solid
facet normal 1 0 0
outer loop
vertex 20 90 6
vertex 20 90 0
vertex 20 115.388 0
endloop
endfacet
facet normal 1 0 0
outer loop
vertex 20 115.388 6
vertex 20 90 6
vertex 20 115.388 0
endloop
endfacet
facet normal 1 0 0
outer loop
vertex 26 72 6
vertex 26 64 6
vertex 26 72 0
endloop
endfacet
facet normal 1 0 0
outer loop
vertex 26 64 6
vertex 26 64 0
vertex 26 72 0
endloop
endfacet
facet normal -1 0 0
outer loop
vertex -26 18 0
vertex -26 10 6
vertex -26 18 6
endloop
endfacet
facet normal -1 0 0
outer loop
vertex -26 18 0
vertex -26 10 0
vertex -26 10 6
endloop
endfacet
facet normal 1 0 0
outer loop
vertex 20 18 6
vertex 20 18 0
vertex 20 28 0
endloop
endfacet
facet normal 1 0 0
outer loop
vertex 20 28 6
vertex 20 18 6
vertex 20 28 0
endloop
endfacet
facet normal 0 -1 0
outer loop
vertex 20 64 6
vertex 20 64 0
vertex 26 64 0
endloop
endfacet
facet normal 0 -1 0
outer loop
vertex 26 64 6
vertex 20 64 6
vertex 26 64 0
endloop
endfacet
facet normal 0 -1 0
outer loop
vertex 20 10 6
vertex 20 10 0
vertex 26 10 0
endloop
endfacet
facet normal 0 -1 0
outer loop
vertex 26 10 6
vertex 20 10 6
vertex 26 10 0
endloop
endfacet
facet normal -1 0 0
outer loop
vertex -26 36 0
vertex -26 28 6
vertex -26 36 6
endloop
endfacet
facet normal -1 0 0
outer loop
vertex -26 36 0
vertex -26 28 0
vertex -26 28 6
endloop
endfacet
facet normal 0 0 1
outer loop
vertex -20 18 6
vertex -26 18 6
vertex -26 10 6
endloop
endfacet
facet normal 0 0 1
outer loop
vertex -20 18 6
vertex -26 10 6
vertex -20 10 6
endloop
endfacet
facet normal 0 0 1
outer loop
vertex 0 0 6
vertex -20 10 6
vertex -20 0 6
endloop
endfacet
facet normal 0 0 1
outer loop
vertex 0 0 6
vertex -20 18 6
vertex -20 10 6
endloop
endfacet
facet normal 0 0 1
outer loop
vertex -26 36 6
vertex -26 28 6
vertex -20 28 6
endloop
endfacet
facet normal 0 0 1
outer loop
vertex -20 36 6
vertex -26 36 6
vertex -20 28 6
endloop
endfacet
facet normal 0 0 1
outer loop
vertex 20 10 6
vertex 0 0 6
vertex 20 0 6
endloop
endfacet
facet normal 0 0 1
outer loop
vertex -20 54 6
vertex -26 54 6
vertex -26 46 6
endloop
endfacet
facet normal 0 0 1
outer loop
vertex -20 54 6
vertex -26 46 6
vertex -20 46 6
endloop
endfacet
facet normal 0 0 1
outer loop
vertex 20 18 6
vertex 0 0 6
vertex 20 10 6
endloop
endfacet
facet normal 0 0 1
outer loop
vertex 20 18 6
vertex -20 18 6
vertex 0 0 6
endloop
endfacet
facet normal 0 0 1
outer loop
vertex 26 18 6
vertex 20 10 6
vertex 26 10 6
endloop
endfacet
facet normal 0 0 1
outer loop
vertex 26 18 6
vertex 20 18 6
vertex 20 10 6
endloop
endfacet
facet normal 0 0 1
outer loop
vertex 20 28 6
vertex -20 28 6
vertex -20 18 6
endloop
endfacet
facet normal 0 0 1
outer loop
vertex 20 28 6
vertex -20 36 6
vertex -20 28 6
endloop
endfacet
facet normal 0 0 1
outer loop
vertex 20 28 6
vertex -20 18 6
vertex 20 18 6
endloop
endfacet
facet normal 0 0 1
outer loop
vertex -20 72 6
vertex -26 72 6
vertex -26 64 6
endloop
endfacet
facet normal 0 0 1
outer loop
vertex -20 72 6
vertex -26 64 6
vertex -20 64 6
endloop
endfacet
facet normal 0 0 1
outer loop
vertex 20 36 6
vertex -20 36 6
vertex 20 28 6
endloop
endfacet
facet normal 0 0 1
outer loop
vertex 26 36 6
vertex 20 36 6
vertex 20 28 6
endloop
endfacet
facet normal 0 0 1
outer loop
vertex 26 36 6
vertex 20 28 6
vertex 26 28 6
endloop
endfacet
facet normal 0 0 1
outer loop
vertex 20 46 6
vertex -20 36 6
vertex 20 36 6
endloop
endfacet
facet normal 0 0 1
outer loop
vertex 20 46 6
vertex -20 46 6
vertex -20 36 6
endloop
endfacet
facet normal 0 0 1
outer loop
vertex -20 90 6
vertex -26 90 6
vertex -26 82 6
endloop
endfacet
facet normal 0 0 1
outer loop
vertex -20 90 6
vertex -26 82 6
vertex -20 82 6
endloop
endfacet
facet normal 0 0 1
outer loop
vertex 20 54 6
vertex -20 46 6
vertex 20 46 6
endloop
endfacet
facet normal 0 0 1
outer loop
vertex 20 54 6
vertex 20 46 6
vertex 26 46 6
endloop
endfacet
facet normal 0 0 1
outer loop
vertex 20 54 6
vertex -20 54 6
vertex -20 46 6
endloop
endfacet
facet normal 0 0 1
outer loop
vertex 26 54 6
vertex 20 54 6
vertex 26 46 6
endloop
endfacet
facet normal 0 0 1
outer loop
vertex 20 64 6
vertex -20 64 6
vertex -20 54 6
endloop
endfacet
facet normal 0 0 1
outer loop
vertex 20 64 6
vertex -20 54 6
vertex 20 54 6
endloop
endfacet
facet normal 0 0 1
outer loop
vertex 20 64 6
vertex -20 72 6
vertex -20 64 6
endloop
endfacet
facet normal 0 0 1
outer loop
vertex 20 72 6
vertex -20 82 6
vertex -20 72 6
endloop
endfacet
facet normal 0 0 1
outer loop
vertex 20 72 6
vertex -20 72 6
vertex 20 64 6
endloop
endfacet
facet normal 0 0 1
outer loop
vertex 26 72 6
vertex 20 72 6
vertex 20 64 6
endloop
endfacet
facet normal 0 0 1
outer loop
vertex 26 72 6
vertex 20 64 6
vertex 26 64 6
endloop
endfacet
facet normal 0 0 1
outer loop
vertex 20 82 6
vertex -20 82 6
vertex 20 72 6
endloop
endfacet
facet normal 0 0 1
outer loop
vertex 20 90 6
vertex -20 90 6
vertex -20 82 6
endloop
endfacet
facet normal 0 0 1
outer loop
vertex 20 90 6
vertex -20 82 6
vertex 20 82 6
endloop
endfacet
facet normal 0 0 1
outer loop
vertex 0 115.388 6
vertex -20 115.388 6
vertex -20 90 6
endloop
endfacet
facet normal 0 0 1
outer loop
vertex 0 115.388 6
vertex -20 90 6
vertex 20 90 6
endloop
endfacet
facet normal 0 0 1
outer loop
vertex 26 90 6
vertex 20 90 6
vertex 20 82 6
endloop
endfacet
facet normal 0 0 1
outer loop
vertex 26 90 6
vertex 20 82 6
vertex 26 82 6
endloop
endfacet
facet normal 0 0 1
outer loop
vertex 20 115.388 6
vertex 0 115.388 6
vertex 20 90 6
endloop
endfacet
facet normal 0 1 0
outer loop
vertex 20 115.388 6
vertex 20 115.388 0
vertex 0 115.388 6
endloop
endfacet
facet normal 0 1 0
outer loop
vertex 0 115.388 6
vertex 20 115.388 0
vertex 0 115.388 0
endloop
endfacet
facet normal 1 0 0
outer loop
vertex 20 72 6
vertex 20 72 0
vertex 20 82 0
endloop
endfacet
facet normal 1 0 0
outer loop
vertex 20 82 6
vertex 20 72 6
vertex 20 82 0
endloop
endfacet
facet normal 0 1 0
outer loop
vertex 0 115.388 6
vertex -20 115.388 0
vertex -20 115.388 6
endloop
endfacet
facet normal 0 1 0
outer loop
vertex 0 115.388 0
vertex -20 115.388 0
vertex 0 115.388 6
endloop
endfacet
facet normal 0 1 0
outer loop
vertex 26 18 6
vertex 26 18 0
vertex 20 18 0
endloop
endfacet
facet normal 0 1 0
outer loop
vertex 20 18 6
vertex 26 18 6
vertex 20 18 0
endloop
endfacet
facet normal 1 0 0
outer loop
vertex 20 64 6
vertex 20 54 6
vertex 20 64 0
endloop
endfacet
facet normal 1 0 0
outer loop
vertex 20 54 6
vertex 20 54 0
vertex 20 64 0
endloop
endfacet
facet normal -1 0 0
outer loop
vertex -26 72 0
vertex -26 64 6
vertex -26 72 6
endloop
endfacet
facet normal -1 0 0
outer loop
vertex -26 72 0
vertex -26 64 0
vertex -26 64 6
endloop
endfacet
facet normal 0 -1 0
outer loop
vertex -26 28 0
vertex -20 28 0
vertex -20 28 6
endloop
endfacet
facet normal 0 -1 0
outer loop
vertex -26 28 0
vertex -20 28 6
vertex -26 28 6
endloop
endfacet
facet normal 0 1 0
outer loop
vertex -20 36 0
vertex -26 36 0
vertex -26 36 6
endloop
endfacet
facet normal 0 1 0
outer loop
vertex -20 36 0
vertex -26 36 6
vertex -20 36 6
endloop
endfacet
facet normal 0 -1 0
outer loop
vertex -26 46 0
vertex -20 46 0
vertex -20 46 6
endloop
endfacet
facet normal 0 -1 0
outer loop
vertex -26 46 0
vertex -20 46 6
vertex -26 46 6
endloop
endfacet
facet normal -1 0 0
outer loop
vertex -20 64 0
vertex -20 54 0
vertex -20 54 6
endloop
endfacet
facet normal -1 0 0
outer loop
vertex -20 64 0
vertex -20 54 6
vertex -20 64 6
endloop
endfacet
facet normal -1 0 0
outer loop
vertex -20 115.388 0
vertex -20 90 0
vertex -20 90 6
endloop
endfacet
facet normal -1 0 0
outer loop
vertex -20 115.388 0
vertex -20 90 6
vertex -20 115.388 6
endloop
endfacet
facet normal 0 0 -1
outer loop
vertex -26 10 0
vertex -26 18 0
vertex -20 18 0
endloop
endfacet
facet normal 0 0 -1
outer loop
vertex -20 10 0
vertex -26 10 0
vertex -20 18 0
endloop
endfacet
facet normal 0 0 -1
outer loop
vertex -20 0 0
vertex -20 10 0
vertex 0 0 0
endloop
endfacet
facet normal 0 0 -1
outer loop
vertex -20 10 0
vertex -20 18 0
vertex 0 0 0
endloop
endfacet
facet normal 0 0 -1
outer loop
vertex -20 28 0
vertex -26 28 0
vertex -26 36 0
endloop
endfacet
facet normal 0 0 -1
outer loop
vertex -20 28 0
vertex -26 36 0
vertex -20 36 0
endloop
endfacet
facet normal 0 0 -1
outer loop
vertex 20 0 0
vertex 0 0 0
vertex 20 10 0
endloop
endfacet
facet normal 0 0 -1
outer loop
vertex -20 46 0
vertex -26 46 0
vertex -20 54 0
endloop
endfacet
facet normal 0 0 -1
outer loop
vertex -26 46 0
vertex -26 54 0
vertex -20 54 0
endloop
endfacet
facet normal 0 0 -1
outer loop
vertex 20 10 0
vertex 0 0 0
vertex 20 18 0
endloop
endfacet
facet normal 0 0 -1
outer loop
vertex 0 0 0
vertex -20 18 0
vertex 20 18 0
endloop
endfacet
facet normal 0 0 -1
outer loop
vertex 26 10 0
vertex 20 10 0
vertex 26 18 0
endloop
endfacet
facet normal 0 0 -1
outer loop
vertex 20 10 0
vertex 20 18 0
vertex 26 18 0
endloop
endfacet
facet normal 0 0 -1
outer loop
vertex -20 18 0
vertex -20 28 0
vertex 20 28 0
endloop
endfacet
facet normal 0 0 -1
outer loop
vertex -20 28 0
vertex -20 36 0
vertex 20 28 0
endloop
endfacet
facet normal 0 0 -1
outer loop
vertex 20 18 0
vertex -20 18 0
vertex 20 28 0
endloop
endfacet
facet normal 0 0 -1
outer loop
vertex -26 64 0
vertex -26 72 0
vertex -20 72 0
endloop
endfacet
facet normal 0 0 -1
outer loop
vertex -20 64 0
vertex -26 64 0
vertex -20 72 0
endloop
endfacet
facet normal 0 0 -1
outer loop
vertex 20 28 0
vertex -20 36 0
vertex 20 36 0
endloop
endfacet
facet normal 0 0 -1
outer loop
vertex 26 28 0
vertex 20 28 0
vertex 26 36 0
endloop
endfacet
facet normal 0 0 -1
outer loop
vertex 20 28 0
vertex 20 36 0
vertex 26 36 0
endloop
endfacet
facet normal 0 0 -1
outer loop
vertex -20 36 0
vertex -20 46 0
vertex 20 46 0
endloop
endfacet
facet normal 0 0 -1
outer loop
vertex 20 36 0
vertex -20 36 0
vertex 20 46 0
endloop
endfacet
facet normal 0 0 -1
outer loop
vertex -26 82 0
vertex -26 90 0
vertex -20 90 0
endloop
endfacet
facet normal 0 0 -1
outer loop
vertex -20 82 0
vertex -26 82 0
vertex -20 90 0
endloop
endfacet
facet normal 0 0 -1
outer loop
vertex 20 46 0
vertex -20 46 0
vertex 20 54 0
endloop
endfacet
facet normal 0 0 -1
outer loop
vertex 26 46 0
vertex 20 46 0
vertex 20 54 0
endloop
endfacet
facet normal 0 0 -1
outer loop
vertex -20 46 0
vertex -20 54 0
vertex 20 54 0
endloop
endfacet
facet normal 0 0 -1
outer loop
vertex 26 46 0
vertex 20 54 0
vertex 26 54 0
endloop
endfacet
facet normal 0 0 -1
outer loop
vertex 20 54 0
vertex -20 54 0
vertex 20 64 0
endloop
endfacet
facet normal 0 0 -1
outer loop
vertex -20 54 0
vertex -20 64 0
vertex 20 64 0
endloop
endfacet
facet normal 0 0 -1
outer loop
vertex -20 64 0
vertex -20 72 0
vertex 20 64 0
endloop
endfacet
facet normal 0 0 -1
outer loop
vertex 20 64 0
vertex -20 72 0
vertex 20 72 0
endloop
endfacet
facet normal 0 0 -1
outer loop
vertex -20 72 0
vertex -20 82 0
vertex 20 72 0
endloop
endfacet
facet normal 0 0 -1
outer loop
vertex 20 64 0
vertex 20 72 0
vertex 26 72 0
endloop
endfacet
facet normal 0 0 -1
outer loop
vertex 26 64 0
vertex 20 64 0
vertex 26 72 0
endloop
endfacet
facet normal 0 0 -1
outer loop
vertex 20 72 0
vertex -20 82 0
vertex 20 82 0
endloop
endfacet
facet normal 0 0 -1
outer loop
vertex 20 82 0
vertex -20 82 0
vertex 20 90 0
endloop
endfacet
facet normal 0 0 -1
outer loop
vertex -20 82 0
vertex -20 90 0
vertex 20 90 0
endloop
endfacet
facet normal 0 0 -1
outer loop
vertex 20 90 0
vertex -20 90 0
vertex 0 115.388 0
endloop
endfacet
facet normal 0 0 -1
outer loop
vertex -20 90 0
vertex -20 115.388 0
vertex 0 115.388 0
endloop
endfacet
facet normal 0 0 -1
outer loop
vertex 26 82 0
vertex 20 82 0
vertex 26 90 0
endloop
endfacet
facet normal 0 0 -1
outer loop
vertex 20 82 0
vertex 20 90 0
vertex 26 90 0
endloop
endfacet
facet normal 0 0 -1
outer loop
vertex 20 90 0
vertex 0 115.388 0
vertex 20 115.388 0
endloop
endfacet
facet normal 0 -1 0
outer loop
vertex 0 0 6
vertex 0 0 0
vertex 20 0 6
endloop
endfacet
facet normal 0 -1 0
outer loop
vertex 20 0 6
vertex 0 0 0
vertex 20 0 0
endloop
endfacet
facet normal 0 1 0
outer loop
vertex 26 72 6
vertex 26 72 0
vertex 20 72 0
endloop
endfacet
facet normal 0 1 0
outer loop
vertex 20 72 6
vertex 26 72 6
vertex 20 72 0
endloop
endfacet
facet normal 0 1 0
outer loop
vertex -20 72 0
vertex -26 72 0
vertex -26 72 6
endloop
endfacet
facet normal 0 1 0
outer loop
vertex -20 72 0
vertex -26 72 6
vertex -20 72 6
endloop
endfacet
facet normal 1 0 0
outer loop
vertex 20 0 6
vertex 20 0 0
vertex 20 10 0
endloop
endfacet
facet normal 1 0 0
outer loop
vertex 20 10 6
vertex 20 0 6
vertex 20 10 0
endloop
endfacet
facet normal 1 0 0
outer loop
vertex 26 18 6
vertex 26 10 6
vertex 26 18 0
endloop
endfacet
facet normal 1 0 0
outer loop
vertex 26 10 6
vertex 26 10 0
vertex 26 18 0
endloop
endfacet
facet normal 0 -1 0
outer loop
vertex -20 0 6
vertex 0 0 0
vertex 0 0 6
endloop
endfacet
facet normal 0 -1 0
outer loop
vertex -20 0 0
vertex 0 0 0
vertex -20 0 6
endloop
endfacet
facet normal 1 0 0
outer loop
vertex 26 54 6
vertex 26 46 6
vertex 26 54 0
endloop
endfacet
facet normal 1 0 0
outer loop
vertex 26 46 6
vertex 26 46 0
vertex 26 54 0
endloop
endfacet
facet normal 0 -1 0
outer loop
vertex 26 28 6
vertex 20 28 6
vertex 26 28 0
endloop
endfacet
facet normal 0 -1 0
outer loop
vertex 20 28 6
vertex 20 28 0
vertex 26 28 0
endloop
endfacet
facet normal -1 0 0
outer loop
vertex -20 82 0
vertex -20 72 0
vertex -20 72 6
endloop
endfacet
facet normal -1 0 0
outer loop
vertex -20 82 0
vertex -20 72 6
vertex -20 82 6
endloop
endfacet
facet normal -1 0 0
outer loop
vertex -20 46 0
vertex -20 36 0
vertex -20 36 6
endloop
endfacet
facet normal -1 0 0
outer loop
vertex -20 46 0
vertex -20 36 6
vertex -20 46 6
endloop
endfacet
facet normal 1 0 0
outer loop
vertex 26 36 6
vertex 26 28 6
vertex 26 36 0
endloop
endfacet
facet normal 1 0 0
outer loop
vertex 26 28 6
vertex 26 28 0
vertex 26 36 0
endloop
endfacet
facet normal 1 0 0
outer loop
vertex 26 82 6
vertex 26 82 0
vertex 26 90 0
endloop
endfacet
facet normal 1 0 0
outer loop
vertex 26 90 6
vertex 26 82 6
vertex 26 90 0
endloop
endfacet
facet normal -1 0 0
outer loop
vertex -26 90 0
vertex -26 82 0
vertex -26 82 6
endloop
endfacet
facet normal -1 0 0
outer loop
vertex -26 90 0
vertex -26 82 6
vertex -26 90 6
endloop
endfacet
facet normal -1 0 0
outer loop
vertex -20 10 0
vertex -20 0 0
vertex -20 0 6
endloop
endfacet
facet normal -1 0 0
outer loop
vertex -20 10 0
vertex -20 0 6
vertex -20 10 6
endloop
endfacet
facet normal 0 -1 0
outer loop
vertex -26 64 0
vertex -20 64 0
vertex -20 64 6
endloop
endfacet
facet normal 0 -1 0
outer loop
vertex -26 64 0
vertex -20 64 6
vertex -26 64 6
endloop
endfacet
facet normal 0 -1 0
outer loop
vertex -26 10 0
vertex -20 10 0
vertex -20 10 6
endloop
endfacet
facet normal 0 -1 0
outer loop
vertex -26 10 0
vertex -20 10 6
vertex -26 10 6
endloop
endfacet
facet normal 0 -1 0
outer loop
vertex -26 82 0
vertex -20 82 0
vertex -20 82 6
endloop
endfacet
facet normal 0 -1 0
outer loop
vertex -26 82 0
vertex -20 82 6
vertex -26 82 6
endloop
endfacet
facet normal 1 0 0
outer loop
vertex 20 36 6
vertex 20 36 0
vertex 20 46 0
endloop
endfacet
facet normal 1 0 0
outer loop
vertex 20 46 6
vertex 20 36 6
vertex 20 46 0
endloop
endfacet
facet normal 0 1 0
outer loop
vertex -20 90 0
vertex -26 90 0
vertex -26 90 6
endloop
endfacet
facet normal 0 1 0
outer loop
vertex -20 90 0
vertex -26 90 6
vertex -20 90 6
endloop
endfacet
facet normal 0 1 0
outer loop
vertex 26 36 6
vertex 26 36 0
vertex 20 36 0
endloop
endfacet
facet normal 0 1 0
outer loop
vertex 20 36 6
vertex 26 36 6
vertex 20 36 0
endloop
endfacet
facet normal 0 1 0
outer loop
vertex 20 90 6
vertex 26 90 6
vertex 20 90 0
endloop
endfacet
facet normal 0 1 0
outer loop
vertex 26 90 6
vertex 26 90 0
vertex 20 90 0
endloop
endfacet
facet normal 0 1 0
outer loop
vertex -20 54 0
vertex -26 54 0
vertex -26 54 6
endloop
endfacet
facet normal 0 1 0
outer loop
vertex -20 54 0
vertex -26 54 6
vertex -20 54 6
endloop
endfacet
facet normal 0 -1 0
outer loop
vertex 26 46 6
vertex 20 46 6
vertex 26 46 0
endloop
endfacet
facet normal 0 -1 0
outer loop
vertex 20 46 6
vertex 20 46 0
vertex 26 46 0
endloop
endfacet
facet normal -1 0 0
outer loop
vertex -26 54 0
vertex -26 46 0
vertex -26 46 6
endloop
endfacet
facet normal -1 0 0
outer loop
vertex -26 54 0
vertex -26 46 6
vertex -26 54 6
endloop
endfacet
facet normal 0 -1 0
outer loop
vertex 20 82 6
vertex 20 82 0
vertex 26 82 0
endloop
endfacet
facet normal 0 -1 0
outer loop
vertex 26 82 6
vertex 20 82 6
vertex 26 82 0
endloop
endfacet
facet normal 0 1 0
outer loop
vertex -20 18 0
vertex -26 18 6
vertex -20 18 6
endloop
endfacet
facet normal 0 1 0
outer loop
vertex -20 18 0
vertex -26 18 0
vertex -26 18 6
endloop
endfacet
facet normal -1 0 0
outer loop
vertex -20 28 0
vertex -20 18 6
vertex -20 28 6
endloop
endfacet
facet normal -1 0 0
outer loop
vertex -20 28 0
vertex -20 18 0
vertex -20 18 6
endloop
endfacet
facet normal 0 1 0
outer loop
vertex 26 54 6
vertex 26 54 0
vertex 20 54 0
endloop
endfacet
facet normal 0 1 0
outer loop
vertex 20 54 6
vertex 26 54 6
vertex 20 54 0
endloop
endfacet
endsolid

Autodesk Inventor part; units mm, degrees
ref_plane "YZ Plane" through (0, 0, 0) normal (1, 0, 0) x (0, 1, 0)
ref_plane "XZ Plane" through (0, 0, 0) normal (0, 1, 0) x (-1, 0, 0)
ref_plane "XY Plane" through (0, 0, 0) normal (0, 0, 1) x (1, 0, 0)
sketch "Sketch1" plane through (0, 0, 0) normal (0, 0, 1) x (1, 0, 0)
  line L0 (0, 0) -> (-20, 0)
  line L1 (-20, 0) -> (-20, 10)
  line L2 (-20, 10) -> (-26, 10)
  line L3 (-26, 10) -> (-26, 18)
  line L4 (-26, 18) -> (-20, 18)
  line L5 (-20, 18) -> (-20, 28)
  line L6 (-20, 28) -> (-26, 28)
  line L7 (-26, 28) -> (-26, 36)
  line L8 (-26, 36) -> (-20, 36)
  line L9 (-20, 36) -> (-20, 46)
  line L10 (-20, 46) -> (-26, 46)
  line L11 (-26, 46) -> (-26, 54)
  line L12 (-26, 54) -> (-20, 54)
  line L13 (-20, 54) -> (-20, 64)
  line L14 (-20, 64) -> (-26, 64)
  line L15 (-26, 64) -> (-26, 72)
  line L16 (-26, 72) -> (-20, 72)
  line L17 (-20, 72) -> (-20, 82)
  line L18 (-20, 82) -> (-26, 82)
  line L19 (-26, 82) -> (-26, 90)
  line L20 (-26, 90) -> (-20, 90)
  line L21 (-20, 90) -> (-20, 115.388)
  line L22 (-20, 115.388) -> (0, 115.388)
  line L23 (0, 115.388) -> (0, 0) construction
  line L24 (0, 0) -> (20, 0)
  line L25 (20, 0) -> (20, 10)
  line L26 (20, 10) -> (26, 10)
  line L27 (26, 10) -> (26, 18)
  line L28 (26, 18) -> (20, 18)
  line L29 (20, 18) -> (20, 28)
  line L30 (26, 28) -> (26, 36)
  line L31 (26, 36) -> (20, 36)
  line L32 (20, 36) -> (20, 46)
  line L33 (20, 46) -> (26, 46)
  line L34 (26, 46) -> (26, 54)
  line L35 (26, 54) -> (20, 54)
  line L36 (20, 54) -> (20, 64)
  line L37 (20, 64) -> (26, 64)
  line L38 (26, 64) -> (26, 72)
  line L39 (26, 72) -> (20, 72)
  line L40 (20, 72) -> (20, 82)
  line L41 (20, 82) -> (26, 82)
  line L42 (26, 82) -> (26, 90)
  line L43 (26, 90) -> (20, 90)
  line L44 (20, 90) -> (20, 115.388)
  line L45 (20, 115.388) -> (0, 115.388)
  line L46 (20, 28) -> (26, 28)
  point P0 (-23, 90)
  dimension "d18" = 20
  dimension "d20" = 6
  dimension "d21" = 8
  dimension "d22" = 10
  dimension "d23" = 6
  dimension "d24" = 8
  dimension "d25" = 115.388
  dimension "d33" = 8
  dimension "d34" = 8
  dimension "d35" = 8
  dimension "d36" = 10
  dimension "d37" = 10
  dimension "d38" = 10
  dimension "d39" = 20
  dimension "d42" = 90
extrude "Extrusion1" add sketch "Sketch1" along normal blind 6
properties part number "sort support wall 3"
